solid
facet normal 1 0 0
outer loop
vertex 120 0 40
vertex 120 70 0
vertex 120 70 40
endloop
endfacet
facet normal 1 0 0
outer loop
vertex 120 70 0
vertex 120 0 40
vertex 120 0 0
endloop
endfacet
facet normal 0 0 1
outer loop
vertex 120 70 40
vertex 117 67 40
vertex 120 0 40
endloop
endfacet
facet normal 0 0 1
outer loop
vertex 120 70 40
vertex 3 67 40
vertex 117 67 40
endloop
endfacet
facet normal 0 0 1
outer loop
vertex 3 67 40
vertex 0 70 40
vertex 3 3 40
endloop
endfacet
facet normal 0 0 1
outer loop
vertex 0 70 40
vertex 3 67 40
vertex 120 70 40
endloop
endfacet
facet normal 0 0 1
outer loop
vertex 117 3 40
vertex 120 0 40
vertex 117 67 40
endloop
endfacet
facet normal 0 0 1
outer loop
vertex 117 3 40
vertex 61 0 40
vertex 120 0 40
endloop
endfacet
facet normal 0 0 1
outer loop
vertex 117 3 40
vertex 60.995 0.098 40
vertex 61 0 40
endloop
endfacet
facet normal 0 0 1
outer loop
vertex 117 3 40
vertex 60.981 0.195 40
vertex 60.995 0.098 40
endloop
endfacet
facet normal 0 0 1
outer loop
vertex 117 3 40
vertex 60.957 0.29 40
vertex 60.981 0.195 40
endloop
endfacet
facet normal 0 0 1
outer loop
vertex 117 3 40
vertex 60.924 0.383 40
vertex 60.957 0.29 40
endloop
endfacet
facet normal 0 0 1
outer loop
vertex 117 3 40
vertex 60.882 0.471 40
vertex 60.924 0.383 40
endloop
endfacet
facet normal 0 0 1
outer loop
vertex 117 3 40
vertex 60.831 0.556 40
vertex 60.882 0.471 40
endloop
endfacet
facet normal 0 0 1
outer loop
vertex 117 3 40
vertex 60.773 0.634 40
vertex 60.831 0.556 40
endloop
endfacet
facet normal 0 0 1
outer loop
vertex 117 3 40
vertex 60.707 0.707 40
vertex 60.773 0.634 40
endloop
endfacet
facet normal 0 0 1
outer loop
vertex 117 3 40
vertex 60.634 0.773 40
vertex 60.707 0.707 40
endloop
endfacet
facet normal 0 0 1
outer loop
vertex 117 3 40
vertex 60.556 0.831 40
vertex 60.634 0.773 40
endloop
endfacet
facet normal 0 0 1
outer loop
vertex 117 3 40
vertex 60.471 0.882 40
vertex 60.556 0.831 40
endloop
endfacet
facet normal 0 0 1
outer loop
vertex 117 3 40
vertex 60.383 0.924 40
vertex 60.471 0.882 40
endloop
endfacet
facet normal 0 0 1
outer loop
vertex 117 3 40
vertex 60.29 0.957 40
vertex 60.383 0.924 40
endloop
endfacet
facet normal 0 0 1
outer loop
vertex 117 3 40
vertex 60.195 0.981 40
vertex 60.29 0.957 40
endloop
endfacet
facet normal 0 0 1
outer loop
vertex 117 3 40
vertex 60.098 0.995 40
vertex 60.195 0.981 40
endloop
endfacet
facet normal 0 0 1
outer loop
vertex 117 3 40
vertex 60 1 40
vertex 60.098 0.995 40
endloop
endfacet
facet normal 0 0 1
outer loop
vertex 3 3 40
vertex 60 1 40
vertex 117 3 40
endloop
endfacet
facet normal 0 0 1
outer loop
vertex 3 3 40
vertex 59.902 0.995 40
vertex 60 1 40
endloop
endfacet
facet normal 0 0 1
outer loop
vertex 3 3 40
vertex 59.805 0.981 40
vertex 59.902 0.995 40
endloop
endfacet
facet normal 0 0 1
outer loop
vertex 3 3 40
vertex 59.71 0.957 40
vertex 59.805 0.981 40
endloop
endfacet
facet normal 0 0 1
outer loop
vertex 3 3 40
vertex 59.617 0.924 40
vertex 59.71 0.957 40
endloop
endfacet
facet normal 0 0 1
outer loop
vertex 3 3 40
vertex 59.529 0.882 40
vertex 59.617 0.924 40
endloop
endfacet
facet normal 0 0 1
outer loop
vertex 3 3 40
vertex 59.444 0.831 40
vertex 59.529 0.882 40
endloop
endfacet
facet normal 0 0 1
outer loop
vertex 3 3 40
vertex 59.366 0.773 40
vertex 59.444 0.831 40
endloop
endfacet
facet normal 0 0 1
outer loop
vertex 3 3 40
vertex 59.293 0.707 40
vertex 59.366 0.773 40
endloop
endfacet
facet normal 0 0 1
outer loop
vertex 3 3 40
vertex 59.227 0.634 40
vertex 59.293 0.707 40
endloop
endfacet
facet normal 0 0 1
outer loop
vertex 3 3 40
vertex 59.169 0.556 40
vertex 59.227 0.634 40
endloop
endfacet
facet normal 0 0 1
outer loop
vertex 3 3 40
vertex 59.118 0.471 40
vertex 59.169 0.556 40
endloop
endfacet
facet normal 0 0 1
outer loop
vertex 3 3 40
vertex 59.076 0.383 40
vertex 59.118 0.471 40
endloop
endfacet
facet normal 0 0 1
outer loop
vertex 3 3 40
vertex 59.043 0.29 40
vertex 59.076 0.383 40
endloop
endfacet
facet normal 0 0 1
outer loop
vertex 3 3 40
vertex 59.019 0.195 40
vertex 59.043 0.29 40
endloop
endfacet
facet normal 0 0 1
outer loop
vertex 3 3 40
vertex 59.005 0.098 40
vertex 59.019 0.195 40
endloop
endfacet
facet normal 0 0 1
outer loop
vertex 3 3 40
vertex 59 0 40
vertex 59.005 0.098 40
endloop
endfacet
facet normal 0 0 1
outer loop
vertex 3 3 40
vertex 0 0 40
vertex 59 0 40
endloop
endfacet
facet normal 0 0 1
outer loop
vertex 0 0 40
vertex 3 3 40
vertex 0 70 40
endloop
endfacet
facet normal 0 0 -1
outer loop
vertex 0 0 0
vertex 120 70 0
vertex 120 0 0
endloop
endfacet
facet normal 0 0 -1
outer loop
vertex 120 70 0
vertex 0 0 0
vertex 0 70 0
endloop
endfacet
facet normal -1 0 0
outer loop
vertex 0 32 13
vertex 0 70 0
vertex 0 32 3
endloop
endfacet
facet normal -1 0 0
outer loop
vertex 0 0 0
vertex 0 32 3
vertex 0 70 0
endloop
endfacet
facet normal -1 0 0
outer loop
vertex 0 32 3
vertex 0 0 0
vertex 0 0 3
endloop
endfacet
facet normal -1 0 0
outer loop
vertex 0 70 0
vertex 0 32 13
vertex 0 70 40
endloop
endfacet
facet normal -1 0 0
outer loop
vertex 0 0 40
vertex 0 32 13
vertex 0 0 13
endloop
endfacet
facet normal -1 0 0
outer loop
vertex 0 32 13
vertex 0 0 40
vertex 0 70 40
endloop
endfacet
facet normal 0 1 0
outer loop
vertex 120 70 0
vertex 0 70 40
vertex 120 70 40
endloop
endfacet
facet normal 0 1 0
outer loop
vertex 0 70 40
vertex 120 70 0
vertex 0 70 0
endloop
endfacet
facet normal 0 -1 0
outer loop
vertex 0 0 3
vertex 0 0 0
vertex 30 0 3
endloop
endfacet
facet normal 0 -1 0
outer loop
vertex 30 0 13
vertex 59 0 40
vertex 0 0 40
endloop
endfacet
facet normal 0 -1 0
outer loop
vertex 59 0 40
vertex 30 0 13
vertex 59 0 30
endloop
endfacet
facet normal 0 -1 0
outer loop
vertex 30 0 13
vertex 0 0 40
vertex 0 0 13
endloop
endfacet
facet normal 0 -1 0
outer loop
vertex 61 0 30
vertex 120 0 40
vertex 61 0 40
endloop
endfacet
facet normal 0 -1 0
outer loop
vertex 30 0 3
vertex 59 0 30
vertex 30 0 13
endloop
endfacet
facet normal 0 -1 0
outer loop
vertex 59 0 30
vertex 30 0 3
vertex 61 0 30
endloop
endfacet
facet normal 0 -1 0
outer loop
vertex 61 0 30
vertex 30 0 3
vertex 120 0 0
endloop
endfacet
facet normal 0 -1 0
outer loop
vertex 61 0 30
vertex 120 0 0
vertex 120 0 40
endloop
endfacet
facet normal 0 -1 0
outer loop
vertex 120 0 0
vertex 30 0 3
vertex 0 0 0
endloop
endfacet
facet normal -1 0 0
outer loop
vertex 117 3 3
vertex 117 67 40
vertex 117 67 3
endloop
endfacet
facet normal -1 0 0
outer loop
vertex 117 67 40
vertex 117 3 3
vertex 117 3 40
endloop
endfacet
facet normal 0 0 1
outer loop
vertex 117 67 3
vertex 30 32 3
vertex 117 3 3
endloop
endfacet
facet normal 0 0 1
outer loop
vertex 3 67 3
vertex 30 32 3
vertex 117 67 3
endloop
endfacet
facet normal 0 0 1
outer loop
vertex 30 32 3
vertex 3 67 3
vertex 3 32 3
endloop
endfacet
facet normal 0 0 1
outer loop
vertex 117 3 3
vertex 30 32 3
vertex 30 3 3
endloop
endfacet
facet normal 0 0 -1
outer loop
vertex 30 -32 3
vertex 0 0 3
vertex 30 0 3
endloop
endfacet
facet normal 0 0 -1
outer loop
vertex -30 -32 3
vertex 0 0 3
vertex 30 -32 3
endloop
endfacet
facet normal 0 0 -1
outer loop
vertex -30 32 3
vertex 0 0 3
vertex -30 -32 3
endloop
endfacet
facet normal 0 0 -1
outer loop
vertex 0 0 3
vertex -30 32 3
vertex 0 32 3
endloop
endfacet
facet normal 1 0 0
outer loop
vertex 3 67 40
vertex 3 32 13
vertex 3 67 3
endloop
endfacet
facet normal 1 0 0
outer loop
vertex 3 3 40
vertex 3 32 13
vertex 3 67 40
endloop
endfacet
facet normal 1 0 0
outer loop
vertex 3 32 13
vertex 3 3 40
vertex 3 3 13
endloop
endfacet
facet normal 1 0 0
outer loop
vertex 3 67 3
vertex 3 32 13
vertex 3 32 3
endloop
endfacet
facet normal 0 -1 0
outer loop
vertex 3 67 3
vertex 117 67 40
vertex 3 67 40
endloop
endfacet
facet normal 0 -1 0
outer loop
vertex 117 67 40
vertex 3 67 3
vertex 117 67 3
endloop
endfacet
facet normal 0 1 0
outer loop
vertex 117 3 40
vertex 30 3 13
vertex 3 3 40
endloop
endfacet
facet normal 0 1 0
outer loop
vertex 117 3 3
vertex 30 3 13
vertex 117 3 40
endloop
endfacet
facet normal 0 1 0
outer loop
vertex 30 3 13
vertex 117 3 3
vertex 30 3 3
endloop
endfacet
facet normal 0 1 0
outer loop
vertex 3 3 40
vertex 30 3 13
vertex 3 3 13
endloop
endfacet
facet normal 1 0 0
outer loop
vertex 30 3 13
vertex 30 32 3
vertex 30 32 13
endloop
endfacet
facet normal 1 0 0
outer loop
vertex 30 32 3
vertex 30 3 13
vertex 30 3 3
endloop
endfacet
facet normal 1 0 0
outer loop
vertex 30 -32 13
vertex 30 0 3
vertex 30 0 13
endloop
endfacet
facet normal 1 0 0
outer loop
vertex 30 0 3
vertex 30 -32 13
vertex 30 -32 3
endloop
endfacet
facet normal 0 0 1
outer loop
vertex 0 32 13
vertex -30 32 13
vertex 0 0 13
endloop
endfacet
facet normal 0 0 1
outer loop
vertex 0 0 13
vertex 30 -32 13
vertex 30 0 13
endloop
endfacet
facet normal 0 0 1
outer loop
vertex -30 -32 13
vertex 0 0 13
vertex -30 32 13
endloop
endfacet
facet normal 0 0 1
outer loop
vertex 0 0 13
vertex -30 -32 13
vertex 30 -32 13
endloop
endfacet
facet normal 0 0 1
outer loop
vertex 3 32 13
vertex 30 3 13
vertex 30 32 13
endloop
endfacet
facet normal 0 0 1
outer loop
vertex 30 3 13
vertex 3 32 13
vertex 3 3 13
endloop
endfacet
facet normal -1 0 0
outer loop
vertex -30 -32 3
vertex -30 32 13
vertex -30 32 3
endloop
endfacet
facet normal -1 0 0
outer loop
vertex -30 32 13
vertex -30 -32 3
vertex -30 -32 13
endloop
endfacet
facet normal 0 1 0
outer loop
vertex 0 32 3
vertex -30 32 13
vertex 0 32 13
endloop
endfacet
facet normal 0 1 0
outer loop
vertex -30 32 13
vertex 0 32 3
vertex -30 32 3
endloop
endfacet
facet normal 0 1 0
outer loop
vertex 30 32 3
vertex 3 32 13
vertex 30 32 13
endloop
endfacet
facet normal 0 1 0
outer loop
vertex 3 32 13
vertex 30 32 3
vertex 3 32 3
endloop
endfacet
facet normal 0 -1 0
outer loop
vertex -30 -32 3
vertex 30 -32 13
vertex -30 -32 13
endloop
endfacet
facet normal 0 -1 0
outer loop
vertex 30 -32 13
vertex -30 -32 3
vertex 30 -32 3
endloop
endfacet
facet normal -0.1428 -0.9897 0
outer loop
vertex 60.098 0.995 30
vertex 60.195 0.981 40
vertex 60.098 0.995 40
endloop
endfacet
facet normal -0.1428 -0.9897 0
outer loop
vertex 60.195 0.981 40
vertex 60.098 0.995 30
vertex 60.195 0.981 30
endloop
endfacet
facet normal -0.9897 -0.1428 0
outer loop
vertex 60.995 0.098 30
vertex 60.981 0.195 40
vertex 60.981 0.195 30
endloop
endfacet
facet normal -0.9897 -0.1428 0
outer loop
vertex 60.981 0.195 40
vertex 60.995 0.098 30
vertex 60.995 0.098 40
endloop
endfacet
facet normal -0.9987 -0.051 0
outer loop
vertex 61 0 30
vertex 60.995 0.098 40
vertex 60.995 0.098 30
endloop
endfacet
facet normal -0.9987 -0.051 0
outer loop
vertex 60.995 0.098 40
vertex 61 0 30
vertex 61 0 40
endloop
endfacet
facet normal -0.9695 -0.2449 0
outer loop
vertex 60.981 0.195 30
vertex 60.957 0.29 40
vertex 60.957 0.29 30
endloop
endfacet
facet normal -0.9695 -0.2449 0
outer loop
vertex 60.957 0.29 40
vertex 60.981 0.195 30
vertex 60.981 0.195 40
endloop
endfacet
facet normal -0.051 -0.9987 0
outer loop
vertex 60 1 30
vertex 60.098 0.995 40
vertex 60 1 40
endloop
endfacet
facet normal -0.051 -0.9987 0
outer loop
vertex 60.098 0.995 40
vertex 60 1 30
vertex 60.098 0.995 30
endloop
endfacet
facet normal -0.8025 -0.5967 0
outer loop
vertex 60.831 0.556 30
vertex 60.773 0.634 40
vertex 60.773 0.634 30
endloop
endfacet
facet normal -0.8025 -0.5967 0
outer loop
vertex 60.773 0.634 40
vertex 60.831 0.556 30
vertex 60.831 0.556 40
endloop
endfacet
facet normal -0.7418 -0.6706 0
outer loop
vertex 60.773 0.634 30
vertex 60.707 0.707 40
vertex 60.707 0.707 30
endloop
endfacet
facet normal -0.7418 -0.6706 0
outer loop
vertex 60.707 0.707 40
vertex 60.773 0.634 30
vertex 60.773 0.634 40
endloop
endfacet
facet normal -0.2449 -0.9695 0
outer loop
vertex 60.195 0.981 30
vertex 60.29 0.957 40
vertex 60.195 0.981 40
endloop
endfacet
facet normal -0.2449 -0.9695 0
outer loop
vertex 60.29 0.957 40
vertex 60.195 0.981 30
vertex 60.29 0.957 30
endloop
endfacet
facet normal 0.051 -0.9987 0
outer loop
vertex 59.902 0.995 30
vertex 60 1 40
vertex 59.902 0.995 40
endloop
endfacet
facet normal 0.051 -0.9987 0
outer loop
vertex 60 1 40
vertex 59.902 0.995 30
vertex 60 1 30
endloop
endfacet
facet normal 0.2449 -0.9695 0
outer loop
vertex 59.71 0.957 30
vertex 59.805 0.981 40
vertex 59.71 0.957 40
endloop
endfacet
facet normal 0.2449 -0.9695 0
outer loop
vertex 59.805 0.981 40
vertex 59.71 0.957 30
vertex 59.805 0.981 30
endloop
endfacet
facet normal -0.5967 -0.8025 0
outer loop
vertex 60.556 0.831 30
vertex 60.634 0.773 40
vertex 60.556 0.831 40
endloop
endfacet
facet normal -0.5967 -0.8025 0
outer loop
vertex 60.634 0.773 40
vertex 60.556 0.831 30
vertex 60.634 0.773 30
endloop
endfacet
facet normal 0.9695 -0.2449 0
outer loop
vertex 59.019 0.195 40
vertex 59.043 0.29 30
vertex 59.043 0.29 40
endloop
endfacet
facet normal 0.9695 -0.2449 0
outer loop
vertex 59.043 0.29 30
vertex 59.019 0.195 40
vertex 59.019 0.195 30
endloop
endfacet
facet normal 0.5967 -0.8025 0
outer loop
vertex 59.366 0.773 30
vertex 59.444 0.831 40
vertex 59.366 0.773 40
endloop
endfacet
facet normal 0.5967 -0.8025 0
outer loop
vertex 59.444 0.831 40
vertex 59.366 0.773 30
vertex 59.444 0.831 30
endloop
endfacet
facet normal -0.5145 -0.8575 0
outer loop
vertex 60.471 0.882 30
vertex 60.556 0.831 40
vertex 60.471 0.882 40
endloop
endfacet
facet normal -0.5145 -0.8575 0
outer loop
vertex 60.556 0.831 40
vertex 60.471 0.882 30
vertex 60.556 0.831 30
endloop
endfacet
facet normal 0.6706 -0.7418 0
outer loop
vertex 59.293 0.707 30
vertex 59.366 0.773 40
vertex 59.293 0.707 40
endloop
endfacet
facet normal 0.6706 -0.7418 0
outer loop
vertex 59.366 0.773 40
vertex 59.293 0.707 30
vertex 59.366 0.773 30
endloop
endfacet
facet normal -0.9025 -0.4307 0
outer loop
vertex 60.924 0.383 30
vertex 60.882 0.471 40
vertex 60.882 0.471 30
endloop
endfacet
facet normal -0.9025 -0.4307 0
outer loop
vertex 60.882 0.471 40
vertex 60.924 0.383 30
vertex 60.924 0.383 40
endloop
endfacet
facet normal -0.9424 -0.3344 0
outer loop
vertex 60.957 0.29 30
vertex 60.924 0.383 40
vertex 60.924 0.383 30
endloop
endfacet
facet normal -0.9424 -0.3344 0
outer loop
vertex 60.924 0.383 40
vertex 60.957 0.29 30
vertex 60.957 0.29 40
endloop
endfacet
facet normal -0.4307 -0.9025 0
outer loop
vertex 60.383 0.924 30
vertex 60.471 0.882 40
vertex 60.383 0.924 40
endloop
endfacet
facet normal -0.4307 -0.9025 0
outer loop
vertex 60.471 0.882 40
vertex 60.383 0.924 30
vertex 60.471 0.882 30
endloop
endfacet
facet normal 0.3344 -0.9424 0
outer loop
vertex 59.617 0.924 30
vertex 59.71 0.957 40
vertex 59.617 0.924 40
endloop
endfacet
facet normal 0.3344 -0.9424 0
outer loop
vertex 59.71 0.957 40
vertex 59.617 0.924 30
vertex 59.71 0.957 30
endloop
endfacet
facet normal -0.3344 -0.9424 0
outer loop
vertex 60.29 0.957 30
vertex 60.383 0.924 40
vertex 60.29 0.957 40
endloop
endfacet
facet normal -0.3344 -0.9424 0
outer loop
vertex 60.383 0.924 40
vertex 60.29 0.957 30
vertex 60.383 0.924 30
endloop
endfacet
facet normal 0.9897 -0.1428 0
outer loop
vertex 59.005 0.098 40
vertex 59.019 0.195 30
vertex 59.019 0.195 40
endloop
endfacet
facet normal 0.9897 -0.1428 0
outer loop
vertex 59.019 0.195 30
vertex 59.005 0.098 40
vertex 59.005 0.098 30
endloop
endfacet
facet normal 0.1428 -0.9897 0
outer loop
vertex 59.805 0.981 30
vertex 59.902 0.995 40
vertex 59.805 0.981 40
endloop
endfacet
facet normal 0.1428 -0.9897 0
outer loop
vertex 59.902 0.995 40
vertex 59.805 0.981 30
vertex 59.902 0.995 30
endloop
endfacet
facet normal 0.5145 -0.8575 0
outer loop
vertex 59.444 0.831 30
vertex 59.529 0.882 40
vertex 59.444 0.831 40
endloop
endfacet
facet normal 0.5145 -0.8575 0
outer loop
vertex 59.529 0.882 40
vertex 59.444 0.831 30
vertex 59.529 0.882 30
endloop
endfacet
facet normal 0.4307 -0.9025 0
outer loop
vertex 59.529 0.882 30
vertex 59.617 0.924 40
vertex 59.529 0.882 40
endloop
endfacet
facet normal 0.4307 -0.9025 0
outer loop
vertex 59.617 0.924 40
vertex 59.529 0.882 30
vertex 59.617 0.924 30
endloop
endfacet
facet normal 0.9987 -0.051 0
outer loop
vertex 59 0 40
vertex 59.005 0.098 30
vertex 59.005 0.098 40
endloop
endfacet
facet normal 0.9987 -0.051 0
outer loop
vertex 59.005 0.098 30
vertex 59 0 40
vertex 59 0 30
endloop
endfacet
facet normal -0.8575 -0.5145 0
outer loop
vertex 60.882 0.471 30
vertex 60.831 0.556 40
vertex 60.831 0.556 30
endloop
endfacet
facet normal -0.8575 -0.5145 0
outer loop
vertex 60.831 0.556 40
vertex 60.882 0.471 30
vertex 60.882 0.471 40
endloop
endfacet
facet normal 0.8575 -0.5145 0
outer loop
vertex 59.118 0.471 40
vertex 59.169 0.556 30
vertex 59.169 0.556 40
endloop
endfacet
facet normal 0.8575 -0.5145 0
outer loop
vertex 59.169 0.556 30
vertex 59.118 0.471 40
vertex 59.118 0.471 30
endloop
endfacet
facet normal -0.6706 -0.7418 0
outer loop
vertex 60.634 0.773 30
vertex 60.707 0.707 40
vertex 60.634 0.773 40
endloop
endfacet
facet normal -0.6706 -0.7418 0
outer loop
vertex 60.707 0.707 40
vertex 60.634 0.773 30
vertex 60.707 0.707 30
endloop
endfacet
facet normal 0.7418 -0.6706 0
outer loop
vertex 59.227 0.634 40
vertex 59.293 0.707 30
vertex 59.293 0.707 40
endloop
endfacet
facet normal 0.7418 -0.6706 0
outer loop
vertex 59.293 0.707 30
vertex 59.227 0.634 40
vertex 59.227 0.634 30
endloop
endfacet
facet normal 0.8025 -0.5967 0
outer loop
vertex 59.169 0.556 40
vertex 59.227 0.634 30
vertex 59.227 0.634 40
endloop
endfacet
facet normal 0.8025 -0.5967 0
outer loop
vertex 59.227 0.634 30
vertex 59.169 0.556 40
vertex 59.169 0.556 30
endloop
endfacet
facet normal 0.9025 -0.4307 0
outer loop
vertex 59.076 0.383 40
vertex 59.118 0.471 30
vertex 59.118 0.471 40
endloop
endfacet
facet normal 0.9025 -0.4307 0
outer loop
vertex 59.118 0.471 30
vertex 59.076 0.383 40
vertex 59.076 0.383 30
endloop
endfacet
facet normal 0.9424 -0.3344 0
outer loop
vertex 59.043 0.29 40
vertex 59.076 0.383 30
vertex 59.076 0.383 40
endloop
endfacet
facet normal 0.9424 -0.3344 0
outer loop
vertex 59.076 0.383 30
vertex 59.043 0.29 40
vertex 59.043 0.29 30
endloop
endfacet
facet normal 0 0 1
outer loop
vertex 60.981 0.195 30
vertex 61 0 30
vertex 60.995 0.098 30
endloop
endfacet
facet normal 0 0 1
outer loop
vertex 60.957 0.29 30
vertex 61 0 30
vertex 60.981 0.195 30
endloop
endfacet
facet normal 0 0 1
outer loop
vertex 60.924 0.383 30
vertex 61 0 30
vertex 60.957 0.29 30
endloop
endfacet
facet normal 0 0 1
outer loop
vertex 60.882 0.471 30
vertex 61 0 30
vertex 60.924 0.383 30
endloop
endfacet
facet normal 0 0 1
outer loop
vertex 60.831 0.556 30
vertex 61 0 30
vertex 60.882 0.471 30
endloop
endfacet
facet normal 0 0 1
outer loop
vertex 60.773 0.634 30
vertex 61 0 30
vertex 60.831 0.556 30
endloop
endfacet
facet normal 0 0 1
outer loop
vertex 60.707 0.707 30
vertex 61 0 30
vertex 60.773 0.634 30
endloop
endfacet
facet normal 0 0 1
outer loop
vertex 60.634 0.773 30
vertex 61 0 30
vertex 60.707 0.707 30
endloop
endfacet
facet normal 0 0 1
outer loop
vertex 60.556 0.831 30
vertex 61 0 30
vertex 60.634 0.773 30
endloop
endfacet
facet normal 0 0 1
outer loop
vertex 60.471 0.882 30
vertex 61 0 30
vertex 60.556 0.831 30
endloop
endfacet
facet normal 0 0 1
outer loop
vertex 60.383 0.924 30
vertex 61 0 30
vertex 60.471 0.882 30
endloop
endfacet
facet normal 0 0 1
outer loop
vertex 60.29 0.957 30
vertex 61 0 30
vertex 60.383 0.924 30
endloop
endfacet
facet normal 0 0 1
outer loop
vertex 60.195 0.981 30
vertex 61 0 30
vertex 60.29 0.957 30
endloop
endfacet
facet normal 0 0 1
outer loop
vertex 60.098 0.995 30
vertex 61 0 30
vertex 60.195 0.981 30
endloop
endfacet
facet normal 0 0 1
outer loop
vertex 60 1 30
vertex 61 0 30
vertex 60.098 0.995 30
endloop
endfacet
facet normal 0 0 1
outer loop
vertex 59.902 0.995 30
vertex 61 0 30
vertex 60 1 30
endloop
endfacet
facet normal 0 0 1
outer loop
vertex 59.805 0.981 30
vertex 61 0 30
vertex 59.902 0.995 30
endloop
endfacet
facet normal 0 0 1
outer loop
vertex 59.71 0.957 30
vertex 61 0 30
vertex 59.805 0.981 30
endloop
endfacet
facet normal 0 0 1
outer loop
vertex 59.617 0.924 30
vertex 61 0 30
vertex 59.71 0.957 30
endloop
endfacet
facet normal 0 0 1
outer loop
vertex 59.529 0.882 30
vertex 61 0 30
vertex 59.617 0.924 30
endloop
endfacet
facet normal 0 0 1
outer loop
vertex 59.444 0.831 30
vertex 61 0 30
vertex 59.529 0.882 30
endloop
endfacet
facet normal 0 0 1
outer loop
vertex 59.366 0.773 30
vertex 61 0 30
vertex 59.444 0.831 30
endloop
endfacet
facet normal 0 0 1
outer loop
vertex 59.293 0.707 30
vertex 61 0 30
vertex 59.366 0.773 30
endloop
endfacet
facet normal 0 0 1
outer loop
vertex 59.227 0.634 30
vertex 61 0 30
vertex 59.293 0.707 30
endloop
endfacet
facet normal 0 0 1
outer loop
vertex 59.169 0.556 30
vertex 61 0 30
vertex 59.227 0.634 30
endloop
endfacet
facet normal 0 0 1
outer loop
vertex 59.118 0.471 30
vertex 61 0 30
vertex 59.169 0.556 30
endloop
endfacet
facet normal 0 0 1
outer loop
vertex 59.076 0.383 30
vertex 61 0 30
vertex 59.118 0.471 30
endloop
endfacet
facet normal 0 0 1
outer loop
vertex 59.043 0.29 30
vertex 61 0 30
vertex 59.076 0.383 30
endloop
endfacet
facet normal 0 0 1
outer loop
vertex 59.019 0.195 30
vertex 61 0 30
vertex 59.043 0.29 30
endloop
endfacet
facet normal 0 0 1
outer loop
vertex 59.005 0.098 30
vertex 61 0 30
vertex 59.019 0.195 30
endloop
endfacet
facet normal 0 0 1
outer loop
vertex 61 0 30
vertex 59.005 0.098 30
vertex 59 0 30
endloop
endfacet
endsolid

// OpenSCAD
$fn = 64;

// Outer dimensions
outer_x = 120;
outer_y = 70;
outer_z = 40;

// Wall and floor thickness
wall_thick = 3;
floor_thick = 3;

// Platform dimensions
plat_x = 60;
plat_y = outer_y - 2 * wall_thick; // Spans full inner width
plat_top_z = 13;
plat_bottom_z = floor_thick;
plat_height = plat_top_z - plat_bottom_z;

// Electrode hole dimensions
hole_diam = 2;
hole_z = 30;
hole_y = 0;

difference() {
    union() {
        // Tank shell (outer box minus inner cavity)
        difference() {
            cube([outer_x, outer_y, outer_z], center = false);
            translate([wall_thick, wall_thick, floor_thick]) 
                cube([outer_x - 2 * wall_thick, outer_y - 2 * wall_thick, outer_z - floor_thick + 0.1], center = false);
        }
        // Raised platform
        translate([-plat_x / 2, -plat_y / 2, plat_bottom_z]) 
            cube([plat_x, plat_y, plat_height], center = false);
    }
    // Electrode holes through end walls
    for (x_pos = [-outer_x / 2, outer_x / 2]) {
        translate([x_pos, hole_y, hole_z]) 
            cylinder(r = hole_diam / 2, h = outer_z + 0.1, center = false);
    }
}
